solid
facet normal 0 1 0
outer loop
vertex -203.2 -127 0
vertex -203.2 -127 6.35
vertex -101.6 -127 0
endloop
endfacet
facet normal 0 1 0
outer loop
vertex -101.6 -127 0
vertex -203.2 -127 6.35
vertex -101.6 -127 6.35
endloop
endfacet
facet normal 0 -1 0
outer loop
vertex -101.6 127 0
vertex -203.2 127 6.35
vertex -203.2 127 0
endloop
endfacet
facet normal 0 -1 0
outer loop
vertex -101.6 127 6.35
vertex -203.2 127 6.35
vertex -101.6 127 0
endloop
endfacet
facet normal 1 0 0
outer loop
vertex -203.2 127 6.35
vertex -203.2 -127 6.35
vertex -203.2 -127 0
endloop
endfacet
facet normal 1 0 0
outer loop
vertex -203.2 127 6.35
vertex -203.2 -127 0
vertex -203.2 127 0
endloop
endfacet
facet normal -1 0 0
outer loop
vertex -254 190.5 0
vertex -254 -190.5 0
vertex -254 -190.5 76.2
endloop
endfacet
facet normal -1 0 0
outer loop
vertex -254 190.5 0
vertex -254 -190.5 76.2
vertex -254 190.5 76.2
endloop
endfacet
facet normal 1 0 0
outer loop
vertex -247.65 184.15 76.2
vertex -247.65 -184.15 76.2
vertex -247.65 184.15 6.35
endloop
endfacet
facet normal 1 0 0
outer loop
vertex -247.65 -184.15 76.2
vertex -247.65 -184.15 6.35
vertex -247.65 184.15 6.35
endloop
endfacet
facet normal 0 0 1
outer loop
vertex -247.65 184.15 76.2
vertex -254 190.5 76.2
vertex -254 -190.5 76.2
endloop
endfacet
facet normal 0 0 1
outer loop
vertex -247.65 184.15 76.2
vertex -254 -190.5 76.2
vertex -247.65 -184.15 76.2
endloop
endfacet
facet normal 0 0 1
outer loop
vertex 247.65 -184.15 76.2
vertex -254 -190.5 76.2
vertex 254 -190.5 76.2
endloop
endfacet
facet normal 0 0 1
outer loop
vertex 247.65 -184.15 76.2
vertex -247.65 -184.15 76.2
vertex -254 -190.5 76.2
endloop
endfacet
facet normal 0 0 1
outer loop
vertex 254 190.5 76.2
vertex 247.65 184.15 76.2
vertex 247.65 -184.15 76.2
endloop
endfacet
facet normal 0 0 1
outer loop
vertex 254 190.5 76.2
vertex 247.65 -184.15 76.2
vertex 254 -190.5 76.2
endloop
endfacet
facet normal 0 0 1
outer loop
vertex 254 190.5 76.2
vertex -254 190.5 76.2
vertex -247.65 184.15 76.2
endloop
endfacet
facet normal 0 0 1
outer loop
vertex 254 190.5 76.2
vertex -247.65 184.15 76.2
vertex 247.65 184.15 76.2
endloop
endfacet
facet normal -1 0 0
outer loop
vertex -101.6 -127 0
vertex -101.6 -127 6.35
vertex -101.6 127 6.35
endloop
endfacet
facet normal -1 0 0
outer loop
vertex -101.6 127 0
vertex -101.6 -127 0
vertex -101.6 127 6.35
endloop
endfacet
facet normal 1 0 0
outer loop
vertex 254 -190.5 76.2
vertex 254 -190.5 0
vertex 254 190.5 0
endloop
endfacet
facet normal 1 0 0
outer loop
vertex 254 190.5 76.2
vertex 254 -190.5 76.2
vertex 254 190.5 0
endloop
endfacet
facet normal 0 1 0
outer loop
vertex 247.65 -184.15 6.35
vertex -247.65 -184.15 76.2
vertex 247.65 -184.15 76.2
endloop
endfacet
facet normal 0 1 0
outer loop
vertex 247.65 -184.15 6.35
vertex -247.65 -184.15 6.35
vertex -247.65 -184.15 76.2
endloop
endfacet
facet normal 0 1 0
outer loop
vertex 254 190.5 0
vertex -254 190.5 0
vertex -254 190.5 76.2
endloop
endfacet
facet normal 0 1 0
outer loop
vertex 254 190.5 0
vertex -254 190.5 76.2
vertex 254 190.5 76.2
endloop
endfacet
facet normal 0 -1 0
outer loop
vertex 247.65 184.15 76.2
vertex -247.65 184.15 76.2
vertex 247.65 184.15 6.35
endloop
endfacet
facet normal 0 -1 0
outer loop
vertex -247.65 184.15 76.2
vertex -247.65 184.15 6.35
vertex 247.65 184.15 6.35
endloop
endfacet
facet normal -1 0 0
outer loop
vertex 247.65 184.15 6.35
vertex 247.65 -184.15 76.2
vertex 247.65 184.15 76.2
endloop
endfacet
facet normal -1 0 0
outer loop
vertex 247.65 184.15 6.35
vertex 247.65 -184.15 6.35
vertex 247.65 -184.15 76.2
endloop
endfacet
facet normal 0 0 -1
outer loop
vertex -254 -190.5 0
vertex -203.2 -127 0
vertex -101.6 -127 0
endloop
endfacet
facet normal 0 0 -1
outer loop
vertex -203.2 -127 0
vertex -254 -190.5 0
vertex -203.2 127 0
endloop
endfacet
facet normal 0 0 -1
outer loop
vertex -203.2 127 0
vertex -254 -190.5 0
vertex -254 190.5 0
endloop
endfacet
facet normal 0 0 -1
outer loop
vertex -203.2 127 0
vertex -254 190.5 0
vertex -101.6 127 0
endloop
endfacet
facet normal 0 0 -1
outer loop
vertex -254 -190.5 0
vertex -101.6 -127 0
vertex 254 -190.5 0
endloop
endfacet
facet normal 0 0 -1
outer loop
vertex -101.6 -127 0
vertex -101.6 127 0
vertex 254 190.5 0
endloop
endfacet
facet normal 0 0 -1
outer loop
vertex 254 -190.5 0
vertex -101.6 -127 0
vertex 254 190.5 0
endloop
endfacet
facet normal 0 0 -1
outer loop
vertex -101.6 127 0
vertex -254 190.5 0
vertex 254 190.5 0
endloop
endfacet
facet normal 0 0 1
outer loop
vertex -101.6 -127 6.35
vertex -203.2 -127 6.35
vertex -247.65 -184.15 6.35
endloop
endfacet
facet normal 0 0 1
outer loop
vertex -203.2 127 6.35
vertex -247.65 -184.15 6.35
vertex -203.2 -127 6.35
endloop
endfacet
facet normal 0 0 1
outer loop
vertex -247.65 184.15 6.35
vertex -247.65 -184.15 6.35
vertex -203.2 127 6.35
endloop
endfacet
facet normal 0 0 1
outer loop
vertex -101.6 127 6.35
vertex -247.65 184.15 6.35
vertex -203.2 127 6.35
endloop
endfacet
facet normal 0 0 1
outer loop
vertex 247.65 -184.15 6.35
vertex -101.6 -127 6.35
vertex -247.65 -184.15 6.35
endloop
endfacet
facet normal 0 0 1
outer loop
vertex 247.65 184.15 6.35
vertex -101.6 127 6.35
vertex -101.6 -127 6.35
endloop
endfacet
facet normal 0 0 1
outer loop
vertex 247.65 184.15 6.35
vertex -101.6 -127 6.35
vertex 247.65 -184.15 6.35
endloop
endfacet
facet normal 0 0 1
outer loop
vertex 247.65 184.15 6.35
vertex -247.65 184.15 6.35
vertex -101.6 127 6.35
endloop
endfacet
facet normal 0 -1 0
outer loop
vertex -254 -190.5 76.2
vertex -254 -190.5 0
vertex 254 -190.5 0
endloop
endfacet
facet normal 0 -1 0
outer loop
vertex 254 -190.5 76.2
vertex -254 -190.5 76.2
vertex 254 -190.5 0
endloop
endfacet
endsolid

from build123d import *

# Parameters (mm, degrees)
F0_W     = 508
F0_H     = 381
F1_DEPTH = 76.2
F2_W     = 101.6
F2_H     = 254
F3_DEPTH = 76.2
F4_T     = -6.35
F5_W     = 114.3
F5_H     = 266.7
F6_DEPTH = 69.85


with BuildPart() as f1:
    # F0 (on Top) → F1 (new body)
    with BuildSketch(Plane.XY):
        Rectangle(F0_W, F0_H)
    extrude(amount=F1_DEPTH)

    # F2 (on face) → F3 (cut, through all)
    with BuildSketch(Plane.XY.offset(76.2)):
        with Locations((-152.4, 0)):
            Rectangle(F2_W, F2_H)
    extrude(amount=-F3_DEPTH, mode=Mode.SUBTRACT)

    # F4
    f4_openings = [f1.faces().sort_by_distance(p)[0] for p in [
        (23.446154, 0, 76.2),
    ]]
    offset(amount=F4_T, openings=f4_openings)

    # F5 (on face) → F6 (cut)
    with BuildSketch(Plane.XY.offset(76.2)):
        with Locations((-152.4, 0)):
            Rectangle(F5_W, F5_H)
    extrude(amount=-F6_DEPTH, mode=Mode.SUBTRACT)


solid = f1.part
